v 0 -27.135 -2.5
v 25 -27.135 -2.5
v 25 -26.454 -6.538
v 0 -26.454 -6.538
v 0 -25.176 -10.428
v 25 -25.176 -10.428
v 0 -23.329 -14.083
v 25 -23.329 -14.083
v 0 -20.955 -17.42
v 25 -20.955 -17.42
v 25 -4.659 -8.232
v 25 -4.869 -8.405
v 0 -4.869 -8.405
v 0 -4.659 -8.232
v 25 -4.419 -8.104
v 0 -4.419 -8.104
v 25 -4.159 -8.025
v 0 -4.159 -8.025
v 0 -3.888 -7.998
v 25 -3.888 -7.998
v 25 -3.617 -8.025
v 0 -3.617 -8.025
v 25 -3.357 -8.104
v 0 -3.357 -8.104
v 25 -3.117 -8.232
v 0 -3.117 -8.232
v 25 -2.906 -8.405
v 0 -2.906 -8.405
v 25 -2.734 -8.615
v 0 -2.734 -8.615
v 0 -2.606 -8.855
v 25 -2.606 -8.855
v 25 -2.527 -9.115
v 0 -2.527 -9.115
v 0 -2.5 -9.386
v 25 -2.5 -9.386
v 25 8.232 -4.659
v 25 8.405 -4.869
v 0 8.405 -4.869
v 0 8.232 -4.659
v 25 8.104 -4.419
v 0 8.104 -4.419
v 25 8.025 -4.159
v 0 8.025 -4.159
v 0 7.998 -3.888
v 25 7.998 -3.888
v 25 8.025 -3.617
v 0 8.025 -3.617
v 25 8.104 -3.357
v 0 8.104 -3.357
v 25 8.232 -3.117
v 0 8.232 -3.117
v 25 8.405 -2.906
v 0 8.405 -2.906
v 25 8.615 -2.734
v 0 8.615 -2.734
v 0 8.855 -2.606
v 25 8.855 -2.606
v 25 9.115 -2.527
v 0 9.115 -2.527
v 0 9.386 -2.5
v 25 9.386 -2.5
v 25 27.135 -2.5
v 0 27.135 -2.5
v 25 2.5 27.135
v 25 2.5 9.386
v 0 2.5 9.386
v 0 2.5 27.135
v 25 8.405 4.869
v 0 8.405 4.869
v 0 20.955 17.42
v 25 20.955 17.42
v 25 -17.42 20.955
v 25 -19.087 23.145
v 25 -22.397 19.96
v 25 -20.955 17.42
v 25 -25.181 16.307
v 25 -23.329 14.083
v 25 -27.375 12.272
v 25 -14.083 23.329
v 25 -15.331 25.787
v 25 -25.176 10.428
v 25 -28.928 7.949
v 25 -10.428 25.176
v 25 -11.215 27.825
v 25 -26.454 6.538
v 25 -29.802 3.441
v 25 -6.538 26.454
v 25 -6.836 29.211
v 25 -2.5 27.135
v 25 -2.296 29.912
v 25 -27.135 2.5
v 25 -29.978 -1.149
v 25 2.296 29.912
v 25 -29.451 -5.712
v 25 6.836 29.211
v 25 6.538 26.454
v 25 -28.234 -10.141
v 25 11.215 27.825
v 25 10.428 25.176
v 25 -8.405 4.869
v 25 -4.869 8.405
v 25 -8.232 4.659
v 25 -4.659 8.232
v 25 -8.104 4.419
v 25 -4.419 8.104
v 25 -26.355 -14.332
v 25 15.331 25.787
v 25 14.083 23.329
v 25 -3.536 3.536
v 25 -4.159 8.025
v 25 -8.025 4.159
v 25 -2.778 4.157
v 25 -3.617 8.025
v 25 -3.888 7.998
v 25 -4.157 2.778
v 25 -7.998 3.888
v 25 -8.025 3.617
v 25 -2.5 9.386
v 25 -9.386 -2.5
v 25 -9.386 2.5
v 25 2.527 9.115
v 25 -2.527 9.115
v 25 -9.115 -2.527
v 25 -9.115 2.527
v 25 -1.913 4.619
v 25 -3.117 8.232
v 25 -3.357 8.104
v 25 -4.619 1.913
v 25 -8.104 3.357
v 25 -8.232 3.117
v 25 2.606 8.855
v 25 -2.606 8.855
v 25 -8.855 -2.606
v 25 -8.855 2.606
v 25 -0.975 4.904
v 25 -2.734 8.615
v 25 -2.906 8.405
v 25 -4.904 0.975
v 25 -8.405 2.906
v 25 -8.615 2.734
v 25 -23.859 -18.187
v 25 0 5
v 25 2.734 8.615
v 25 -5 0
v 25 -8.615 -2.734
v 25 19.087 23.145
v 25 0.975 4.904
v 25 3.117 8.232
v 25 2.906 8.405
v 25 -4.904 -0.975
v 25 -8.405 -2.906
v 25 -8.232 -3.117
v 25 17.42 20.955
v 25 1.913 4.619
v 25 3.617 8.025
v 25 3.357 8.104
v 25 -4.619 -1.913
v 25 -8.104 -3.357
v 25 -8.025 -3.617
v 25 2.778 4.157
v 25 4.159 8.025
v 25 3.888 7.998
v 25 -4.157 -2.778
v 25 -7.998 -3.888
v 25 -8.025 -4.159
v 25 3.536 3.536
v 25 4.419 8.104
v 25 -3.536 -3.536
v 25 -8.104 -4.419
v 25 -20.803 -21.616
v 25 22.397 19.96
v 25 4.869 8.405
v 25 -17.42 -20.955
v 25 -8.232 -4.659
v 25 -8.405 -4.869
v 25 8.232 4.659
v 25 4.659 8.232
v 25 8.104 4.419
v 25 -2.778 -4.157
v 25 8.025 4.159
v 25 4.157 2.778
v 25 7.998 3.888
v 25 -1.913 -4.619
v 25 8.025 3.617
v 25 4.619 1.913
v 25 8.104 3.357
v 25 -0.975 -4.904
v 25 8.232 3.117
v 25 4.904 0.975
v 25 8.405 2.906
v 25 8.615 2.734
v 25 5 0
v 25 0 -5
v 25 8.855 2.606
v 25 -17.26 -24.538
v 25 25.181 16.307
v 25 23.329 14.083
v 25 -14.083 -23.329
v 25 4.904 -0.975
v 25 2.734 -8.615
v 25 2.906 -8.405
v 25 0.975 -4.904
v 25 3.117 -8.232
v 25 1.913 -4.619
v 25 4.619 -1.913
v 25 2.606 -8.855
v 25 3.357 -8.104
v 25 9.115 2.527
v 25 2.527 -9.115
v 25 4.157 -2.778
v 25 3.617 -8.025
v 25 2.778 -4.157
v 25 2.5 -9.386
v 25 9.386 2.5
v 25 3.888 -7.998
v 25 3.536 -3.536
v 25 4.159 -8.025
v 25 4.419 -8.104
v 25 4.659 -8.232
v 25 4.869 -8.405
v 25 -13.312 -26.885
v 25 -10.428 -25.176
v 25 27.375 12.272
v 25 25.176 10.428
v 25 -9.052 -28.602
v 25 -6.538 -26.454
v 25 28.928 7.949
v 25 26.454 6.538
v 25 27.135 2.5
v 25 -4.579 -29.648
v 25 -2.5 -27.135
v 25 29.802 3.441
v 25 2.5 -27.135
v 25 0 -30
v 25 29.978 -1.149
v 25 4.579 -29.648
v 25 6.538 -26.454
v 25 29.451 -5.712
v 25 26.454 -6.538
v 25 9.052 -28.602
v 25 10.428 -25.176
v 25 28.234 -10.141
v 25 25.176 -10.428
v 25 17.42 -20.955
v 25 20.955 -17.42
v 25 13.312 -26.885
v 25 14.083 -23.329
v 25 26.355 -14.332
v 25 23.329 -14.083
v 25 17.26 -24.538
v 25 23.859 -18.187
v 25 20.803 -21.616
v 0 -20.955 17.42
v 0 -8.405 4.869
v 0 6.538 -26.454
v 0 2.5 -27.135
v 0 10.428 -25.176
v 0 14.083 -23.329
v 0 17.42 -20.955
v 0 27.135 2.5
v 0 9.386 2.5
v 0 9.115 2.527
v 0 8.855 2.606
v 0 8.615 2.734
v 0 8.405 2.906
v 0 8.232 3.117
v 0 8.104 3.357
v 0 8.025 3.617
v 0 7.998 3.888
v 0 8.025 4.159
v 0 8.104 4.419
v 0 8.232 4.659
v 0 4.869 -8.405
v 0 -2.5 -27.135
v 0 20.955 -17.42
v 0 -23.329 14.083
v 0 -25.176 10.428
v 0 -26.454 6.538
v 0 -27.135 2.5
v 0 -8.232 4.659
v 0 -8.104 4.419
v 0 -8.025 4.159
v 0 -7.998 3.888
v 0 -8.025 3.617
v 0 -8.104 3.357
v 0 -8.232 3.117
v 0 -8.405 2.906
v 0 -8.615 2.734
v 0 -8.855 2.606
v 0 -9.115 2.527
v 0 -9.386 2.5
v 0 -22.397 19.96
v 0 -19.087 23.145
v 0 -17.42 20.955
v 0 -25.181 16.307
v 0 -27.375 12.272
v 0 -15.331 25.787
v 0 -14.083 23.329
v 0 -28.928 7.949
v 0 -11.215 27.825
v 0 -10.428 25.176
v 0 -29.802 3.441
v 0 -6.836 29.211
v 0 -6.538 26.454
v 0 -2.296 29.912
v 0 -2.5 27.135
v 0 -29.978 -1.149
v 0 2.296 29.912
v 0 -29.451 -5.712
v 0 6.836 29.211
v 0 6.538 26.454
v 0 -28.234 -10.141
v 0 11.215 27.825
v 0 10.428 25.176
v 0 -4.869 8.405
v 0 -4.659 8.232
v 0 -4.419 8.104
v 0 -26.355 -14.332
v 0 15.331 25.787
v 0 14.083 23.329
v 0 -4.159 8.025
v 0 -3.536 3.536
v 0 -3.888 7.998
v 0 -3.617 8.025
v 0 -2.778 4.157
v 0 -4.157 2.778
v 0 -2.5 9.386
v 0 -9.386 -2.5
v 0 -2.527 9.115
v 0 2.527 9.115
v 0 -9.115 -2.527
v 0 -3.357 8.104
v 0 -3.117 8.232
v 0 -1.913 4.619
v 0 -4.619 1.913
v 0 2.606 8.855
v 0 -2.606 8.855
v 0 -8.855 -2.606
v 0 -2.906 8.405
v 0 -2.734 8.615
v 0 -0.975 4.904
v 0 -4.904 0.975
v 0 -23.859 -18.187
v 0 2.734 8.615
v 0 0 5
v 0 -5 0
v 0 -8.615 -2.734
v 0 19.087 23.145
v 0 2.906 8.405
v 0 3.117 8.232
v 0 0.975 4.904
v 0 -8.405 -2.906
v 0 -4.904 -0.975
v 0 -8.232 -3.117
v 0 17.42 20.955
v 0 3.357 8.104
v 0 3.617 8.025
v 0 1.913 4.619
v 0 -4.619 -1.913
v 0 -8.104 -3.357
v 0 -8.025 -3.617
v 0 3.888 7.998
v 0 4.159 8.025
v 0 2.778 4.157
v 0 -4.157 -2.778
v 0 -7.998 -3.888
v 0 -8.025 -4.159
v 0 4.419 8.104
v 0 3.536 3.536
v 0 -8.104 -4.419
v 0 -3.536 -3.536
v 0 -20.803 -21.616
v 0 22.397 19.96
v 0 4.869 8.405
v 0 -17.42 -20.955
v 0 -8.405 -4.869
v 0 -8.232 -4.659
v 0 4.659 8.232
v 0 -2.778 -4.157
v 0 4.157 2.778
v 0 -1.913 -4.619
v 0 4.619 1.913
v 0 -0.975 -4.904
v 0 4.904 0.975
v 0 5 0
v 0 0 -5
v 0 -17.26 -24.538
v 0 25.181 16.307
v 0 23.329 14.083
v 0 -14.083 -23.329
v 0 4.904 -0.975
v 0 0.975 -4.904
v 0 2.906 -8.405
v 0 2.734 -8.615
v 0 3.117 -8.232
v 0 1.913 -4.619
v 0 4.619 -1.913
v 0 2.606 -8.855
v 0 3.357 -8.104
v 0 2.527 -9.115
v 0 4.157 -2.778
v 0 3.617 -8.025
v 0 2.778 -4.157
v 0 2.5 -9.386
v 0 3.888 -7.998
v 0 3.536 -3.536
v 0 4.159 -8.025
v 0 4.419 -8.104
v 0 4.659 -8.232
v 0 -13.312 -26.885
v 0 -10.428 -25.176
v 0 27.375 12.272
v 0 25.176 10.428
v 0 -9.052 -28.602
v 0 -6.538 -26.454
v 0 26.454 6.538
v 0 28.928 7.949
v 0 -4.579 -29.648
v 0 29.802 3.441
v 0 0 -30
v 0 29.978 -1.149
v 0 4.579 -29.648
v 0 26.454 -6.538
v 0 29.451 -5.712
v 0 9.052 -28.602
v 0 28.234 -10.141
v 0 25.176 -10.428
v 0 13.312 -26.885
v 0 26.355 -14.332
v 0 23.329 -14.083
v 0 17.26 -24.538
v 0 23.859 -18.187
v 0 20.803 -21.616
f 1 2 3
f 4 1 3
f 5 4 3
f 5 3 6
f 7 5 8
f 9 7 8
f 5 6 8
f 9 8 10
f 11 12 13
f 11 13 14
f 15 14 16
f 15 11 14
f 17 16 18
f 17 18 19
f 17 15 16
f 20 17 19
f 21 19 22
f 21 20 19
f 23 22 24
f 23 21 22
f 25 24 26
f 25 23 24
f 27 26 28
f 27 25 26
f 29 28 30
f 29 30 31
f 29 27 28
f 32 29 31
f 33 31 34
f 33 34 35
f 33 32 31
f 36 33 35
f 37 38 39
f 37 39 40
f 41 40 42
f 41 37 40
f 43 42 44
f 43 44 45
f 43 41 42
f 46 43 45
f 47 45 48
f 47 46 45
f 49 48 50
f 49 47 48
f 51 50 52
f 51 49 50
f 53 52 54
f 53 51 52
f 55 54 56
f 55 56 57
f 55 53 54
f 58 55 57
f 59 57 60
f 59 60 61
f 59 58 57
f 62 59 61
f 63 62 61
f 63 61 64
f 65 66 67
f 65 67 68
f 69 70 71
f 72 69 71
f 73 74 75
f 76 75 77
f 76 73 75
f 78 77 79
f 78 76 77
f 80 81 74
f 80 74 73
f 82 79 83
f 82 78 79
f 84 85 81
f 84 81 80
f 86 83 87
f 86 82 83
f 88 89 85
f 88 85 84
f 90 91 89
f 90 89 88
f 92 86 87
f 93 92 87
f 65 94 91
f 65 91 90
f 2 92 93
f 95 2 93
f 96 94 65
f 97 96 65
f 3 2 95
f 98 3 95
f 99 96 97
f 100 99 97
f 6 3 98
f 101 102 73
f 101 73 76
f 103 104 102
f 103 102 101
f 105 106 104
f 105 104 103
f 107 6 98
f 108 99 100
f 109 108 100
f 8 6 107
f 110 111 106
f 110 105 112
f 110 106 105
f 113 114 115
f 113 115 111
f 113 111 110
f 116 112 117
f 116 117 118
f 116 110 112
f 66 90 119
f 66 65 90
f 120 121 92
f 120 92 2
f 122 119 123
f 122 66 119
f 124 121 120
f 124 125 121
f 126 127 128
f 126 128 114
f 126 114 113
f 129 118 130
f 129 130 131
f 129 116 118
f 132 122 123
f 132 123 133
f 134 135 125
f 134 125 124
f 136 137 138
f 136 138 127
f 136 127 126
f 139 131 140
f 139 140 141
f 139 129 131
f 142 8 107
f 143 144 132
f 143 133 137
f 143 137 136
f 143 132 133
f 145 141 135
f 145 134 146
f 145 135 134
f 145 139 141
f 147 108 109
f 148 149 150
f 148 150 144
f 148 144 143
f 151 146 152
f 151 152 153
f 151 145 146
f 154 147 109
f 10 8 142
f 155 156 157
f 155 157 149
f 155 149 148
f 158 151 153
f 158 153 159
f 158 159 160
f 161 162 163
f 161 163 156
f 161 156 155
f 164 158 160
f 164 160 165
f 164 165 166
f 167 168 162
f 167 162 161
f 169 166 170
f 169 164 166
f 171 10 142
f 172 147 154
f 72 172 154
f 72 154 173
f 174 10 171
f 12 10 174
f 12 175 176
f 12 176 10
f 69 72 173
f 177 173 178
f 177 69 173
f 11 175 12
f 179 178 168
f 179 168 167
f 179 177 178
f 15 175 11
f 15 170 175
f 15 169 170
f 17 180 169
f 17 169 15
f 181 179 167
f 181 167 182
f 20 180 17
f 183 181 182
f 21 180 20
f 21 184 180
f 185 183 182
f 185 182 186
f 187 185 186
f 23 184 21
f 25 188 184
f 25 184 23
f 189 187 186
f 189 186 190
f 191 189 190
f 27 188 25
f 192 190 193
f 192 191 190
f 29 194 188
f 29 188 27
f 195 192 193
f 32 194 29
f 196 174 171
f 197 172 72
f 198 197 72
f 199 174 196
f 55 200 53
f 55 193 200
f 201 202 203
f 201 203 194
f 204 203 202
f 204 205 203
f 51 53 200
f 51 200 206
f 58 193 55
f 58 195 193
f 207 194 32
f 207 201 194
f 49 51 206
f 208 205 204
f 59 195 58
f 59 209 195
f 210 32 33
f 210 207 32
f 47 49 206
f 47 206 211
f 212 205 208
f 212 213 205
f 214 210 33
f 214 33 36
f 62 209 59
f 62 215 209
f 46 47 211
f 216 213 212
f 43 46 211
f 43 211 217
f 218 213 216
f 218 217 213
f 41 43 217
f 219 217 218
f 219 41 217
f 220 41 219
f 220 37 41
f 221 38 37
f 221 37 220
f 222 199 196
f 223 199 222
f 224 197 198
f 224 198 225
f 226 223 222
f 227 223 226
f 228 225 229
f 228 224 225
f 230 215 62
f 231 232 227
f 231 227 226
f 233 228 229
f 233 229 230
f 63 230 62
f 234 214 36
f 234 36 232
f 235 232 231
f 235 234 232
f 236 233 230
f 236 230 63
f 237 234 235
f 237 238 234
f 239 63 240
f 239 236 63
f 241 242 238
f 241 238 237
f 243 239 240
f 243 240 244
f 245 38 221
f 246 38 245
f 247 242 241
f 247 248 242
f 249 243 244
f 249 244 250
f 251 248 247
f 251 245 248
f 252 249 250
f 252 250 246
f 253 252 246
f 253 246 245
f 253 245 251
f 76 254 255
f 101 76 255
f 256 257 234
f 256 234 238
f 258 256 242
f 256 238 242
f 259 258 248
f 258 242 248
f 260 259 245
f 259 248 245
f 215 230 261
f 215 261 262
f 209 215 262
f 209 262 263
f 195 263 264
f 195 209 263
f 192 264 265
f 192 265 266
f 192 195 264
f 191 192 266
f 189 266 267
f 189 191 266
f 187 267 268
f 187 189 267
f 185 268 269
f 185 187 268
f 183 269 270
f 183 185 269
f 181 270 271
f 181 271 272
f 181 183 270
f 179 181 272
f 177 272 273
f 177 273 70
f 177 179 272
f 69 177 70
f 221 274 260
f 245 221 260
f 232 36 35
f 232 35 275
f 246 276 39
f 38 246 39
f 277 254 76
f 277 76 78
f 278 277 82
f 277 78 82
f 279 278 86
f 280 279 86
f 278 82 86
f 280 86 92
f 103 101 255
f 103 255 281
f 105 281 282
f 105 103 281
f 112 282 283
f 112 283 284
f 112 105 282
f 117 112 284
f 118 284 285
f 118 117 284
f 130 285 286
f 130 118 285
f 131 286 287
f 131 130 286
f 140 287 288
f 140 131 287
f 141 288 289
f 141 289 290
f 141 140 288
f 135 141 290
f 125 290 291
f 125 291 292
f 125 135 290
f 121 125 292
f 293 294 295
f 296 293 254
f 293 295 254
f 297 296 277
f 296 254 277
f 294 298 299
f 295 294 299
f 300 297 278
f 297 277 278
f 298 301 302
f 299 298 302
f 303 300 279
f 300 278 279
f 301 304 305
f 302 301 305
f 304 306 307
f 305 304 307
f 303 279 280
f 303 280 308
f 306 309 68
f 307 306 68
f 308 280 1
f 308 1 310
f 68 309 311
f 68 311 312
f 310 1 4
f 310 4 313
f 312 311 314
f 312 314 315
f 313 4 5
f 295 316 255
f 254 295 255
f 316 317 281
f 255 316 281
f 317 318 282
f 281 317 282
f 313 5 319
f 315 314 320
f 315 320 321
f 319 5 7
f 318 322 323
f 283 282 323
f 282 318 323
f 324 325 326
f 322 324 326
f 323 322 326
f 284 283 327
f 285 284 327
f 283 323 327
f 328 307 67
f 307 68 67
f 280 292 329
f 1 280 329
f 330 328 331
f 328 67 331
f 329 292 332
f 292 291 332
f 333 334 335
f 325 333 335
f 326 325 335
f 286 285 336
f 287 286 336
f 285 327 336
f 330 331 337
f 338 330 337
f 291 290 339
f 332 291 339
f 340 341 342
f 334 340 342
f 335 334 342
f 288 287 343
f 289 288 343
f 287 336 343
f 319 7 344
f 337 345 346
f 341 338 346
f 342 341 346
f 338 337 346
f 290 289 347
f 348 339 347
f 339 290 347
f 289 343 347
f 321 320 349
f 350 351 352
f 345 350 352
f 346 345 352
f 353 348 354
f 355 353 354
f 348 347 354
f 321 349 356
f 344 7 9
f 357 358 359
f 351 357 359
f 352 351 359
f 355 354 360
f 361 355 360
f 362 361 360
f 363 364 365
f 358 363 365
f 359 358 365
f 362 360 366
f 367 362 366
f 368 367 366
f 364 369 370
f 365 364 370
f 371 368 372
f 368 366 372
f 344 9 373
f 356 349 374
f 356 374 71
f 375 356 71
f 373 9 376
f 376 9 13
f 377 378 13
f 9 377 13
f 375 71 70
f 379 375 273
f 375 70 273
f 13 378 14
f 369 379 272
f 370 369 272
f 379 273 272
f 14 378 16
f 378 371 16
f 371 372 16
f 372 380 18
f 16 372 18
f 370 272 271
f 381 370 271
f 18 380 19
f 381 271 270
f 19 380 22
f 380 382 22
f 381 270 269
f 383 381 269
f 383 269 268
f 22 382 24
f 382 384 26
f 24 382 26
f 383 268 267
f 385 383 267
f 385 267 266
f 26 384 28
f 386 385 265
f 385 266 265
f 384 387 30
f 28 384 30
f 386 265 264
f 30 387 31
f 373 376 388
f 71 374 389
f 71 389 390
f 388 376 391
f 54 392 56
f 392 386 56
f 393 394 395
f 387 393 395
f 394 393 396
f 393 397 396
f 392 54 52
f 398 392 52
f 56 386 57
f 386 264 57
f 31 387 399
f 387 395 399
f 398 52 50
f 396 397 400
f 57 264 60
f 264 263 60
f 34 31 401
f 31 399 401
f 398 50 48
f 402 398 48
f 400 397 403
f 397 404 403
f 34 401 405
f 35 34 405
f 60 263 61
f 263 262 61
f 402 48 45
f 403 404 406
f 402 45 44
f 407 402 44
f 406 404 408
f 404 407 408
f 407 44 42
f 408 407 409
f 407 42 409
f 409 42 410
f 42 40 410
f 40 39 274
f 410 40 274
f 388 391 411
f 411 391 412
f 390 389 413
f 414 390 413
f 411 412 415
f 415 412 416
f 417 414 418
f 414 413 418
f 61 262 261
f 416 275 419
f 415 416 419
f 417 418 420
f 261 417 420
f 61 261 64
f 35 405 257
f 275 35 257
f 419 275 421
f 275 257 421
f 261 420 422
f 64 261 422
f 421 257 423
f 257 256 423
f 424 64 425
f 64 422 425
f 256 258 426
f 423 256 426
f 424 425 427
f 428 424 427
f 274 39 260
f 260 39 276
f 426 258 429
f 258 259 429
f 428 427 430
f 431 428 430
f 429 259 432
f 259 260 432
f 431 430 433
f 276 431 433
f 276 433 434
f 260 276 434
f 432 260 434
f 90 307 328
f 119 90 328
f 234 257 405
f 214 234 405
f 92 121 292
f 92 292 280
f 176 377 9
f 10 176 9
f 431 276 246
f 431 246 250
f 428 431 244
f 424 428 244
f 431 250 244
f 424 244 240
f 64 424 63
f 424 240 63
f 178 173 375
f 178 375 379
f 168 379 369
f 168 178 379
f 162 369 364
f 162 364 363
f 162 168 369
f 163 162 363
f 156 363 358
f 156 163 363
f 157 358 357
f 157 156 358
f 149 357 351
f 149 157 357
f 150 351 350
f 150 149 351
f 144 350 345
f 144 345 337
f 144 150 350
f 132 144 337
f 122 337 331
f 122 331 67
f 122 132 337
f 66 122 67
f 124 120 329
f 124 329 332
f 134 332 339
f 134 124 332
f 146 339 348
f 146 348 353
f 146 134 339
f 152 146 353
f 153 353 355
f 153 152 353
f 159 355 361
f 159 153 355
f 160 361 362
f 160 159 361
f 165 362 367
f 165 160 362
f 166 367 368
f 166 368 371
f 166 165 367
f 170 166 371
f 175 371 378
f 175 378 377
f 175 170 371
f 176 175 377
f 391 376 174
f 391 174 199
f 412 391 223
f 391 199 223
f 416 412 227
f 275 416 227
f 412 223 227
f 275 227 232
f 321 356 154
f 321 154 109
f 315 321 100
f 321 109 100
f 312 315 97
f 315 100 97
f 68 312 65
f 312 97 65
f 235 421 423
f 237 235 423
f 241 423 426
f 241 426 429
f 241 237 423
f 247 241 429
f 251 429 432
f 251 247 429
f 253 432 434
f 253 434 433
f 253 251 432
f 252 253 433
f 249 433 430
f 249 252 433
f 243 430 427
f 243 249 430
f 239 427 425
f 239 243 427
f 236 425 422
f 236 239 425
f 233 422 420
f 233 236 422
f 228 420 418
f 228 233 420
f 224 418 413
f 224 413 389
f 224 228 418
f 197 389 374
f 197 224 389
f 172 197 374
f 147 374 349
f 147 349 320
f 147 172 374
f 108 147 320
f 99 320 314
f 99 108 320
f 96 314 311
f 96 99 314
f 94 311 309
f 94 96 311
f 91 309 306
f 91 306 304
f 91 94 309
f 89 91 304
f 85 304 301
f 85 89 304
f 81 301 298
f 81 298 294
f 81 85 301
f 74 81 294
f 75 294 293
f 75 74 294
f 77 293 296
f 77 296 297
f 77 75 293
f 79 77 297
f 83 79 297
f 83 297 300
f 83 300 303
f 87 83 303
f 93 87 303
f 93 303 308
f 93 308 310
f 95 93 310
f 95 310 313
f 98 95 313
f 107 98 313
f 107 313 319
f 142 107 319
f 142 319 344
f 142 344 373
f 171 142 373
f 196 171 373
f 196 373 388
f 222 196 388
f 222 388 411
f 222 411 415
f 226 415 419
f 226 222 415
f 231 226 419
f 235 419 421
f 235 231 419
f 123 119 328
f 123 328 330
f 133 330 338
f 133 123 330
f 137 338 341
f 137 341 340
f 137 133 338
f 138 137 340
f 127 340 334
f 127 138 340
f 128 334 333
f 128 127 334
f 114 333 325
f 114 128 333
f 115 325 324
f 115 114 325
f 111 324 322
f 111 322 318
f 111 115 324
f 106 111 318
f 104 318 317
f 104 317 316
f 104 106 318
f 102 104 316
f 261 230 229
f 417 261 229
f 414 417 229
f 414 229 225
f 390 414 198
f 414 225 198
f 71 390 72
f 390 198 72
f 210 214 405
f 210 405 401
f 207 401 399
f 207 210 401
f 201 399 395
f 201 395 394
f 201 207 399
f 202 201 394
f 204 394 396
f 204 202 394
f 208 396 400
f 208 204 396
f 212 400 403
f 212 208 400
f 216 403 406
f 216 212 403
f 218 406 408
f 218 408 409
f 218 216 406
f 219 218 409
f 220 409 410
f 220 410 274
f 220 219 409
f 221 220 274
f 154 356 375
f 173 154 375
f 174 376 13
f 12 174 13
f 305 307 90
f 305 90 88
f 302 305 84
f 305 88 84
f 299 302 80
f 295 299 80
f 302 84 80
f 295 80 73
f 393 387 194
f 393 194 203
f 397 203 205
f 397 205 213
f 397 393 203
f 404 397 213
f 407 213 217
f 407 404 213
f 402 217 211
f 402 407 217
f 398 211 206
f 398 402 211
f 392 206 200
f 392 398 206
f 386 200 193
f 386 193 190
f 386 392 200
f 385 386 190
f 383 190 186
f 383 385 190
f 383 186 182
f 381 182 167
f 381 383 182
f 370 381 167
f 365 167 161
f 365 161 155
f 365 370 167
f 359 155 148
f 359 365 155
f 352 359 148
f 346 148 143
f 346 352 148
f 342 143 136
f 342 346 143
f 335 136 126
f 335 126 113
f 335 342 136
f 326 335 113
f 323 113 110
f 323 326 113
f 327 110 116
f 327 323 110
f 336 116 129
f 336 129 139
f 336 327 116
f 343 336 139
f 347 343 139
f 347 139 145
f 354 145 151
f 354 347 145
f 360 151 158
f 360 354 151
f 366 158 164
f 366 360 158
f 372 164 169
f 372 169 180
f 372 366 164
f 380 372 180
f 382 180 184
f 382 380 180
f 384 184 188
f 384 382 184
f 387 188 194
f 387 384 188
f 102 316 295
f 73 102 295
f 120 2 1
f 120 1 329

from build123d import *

# Parameters (mm, degrees)
SKETCH1_R           = 27.5
SKETCH1_R_2         = 5
BOSS_EXTRUDE1_DEPTH = 25
CUT_EXTRUDE1_DEPTH  = 25
SKETCH3_R           = 30
SKETCH3_R_2         = 27.25
BOSS_EXTRUDE2_DEPTH = 25


with BuildPart() as part:
    # Sketch1 → Boss-Extrude1 (new body)
    with BuildSketch(Plane(origin=(0, 0, 0), x_dir=(0, 0, -1), z_dir=(1, 0, 0))):
        Circle(SKETCH1_R)
        Circle(SKETCH1_R_2, mode=Mode.SUBTRACT)
    extrude(amount=BOSS_EXTRUDE1_DEPTH)

    # Sketch2 → Cut-Extrude1 (cut)
    with BuildSketch(Plane(origin=(25, 0, 0), x_dir=(0, 0, -1), z_dir=(1, 0, 0))):
        with BuildLine():
            Line((-2.5, 27.386127875), (-2.5, 9.386127875))
            ThreePointArc((-2.5, 9.386127875), (-3.356749875, 8.103911075), (-4.869227717, 8.404761623))
            Line((-4.869227717, 8.404761623), (-17.597149778, 21.132683684))
            ThreePointArc((-17.597149778, 21.132683684), (-10.670518583, 25.760910681), (-2.5, 27.386127875))
        make_face()
        with BuildLine():
            Line((17.597149778, 21.132683684), (4.869227717, 8.404761623))
            ThreePointArc((4.869227717, 8.404761623), (3.356749875, 8.103911075), (2.5, 9.386127875))
            Line((2.5, 9.386127875), (2.5, 27.386127875))
            ThreePointArc((2.5, 27.386127875), (10.670518583, 25.760910681), (17.597149778, 21.132683684))
        make_face()
        with BuildLine():
            Line((27.386127875, 2.5), (9.386127875, 2.5))
            ThreePointArc((9.386127875, 2.5), (8.103911075, 3.356749875), (8.404761623, 4.869227717))
            Line((8.404761623, 4.869227717), (21.132683684, 17.597149778))
            ThreePointArc((21.132683684, 17.597149778), (25.760910681, 10.670518583), (27.386127875, 2.5))
        make_face()
        with BuildLine():
            Line((21.132683684, -17.597149778), (8.404761623, -4.869227717))
            ThreePointArc((8.404761623, -4.869227717), (8.103911075, -3.356749875), (9.386127875, -2.5))
            Line((9.386127875, -2.5), (27.386127875, -2.5))
            ThreePointArc((27.386127875, -2.5), (25.760910681, -10.670518583), (21.132683684, -17.597149778))
        make_face()
        with BuildLine():
            Line((2.5, -27.386127875), (2.5, -9.386127875))
            ThreePointArc((2.5, -9.386127875), (3.356749875, -8.103911075), (4.869227717, -8.404761623))
            Line((4.869227717, -8.404761623), (17.597149778, -21.132683684))
            ThreePointArc((17.597149778, -21.132683684), (10.670518583, -25.760910681), (2.5, -27.386127875))
        make_face()
        with BuildLine():
            Line((-17.597149778, -21.132683684), (-4.869227717, -8.404761623))
            ThreePointArc((-4.869227717, -8.404761623), (-3.356749875, -8.103911075), (-2.5, -9.386127875))
            Line((-2.5, -9.386127875), (-2.5, -27.386127875))
            ThreePointArc((-2.5, -27.386127875), (-10.670518583, -25.760910681), (-17.597149778, -21.132683684))
        make_face()
        with BuildLine():
            Line((-27.386127875, -2.5), (-9.386127875, -2.5))
            ThreePointArc((-9.386127875, -2.5), (-8.103911075, -3.356749875), (-8.404761623, -4.869227717))
            Line((-8.404761623, -4.869227717), (-21.132683684, -17.597149778))
            ThreePointArc((-21.132683684, -17.597149778), (-25.760910681, -10.670518583), (-27.386127875, -2.5))
        make_face()
        with BuildLine():
            Line((-21.132683684, 17.597149778), (-8.404761623, 4.869227717))
            ThreePointArc((-8.404761623, 4.869227717), (-8.103911075, 3.356749875), (-9.386127875, 2.5))
            Line((-9.386127875, 2.5), (-27.386127875, 2.5))
            ThreePointArc((-27.386127875, 2.5), (-25.760910681, 10.670518583), (-21.132683684, 17.597149778))
        make_face()
    extrude(amount=-CUT_EXTRUDE1_DEPTH, mode=Mode.SUBTRACT)

    # Sketch3 → Boss-Extrude2 (add)
    with BuildSketch(Plane(origin=(25, 0, 0), x_dir=(0, 0, -1), z_dir=(1, 0, 0))):
        Circle(SKETCH3_R)
        Circle(SKETCH3_R_2, mode=Mode.SUBTRACT)
    extrude(amount=-BOSS_EXTRUDE2_DEPTH)


solid = part.part
